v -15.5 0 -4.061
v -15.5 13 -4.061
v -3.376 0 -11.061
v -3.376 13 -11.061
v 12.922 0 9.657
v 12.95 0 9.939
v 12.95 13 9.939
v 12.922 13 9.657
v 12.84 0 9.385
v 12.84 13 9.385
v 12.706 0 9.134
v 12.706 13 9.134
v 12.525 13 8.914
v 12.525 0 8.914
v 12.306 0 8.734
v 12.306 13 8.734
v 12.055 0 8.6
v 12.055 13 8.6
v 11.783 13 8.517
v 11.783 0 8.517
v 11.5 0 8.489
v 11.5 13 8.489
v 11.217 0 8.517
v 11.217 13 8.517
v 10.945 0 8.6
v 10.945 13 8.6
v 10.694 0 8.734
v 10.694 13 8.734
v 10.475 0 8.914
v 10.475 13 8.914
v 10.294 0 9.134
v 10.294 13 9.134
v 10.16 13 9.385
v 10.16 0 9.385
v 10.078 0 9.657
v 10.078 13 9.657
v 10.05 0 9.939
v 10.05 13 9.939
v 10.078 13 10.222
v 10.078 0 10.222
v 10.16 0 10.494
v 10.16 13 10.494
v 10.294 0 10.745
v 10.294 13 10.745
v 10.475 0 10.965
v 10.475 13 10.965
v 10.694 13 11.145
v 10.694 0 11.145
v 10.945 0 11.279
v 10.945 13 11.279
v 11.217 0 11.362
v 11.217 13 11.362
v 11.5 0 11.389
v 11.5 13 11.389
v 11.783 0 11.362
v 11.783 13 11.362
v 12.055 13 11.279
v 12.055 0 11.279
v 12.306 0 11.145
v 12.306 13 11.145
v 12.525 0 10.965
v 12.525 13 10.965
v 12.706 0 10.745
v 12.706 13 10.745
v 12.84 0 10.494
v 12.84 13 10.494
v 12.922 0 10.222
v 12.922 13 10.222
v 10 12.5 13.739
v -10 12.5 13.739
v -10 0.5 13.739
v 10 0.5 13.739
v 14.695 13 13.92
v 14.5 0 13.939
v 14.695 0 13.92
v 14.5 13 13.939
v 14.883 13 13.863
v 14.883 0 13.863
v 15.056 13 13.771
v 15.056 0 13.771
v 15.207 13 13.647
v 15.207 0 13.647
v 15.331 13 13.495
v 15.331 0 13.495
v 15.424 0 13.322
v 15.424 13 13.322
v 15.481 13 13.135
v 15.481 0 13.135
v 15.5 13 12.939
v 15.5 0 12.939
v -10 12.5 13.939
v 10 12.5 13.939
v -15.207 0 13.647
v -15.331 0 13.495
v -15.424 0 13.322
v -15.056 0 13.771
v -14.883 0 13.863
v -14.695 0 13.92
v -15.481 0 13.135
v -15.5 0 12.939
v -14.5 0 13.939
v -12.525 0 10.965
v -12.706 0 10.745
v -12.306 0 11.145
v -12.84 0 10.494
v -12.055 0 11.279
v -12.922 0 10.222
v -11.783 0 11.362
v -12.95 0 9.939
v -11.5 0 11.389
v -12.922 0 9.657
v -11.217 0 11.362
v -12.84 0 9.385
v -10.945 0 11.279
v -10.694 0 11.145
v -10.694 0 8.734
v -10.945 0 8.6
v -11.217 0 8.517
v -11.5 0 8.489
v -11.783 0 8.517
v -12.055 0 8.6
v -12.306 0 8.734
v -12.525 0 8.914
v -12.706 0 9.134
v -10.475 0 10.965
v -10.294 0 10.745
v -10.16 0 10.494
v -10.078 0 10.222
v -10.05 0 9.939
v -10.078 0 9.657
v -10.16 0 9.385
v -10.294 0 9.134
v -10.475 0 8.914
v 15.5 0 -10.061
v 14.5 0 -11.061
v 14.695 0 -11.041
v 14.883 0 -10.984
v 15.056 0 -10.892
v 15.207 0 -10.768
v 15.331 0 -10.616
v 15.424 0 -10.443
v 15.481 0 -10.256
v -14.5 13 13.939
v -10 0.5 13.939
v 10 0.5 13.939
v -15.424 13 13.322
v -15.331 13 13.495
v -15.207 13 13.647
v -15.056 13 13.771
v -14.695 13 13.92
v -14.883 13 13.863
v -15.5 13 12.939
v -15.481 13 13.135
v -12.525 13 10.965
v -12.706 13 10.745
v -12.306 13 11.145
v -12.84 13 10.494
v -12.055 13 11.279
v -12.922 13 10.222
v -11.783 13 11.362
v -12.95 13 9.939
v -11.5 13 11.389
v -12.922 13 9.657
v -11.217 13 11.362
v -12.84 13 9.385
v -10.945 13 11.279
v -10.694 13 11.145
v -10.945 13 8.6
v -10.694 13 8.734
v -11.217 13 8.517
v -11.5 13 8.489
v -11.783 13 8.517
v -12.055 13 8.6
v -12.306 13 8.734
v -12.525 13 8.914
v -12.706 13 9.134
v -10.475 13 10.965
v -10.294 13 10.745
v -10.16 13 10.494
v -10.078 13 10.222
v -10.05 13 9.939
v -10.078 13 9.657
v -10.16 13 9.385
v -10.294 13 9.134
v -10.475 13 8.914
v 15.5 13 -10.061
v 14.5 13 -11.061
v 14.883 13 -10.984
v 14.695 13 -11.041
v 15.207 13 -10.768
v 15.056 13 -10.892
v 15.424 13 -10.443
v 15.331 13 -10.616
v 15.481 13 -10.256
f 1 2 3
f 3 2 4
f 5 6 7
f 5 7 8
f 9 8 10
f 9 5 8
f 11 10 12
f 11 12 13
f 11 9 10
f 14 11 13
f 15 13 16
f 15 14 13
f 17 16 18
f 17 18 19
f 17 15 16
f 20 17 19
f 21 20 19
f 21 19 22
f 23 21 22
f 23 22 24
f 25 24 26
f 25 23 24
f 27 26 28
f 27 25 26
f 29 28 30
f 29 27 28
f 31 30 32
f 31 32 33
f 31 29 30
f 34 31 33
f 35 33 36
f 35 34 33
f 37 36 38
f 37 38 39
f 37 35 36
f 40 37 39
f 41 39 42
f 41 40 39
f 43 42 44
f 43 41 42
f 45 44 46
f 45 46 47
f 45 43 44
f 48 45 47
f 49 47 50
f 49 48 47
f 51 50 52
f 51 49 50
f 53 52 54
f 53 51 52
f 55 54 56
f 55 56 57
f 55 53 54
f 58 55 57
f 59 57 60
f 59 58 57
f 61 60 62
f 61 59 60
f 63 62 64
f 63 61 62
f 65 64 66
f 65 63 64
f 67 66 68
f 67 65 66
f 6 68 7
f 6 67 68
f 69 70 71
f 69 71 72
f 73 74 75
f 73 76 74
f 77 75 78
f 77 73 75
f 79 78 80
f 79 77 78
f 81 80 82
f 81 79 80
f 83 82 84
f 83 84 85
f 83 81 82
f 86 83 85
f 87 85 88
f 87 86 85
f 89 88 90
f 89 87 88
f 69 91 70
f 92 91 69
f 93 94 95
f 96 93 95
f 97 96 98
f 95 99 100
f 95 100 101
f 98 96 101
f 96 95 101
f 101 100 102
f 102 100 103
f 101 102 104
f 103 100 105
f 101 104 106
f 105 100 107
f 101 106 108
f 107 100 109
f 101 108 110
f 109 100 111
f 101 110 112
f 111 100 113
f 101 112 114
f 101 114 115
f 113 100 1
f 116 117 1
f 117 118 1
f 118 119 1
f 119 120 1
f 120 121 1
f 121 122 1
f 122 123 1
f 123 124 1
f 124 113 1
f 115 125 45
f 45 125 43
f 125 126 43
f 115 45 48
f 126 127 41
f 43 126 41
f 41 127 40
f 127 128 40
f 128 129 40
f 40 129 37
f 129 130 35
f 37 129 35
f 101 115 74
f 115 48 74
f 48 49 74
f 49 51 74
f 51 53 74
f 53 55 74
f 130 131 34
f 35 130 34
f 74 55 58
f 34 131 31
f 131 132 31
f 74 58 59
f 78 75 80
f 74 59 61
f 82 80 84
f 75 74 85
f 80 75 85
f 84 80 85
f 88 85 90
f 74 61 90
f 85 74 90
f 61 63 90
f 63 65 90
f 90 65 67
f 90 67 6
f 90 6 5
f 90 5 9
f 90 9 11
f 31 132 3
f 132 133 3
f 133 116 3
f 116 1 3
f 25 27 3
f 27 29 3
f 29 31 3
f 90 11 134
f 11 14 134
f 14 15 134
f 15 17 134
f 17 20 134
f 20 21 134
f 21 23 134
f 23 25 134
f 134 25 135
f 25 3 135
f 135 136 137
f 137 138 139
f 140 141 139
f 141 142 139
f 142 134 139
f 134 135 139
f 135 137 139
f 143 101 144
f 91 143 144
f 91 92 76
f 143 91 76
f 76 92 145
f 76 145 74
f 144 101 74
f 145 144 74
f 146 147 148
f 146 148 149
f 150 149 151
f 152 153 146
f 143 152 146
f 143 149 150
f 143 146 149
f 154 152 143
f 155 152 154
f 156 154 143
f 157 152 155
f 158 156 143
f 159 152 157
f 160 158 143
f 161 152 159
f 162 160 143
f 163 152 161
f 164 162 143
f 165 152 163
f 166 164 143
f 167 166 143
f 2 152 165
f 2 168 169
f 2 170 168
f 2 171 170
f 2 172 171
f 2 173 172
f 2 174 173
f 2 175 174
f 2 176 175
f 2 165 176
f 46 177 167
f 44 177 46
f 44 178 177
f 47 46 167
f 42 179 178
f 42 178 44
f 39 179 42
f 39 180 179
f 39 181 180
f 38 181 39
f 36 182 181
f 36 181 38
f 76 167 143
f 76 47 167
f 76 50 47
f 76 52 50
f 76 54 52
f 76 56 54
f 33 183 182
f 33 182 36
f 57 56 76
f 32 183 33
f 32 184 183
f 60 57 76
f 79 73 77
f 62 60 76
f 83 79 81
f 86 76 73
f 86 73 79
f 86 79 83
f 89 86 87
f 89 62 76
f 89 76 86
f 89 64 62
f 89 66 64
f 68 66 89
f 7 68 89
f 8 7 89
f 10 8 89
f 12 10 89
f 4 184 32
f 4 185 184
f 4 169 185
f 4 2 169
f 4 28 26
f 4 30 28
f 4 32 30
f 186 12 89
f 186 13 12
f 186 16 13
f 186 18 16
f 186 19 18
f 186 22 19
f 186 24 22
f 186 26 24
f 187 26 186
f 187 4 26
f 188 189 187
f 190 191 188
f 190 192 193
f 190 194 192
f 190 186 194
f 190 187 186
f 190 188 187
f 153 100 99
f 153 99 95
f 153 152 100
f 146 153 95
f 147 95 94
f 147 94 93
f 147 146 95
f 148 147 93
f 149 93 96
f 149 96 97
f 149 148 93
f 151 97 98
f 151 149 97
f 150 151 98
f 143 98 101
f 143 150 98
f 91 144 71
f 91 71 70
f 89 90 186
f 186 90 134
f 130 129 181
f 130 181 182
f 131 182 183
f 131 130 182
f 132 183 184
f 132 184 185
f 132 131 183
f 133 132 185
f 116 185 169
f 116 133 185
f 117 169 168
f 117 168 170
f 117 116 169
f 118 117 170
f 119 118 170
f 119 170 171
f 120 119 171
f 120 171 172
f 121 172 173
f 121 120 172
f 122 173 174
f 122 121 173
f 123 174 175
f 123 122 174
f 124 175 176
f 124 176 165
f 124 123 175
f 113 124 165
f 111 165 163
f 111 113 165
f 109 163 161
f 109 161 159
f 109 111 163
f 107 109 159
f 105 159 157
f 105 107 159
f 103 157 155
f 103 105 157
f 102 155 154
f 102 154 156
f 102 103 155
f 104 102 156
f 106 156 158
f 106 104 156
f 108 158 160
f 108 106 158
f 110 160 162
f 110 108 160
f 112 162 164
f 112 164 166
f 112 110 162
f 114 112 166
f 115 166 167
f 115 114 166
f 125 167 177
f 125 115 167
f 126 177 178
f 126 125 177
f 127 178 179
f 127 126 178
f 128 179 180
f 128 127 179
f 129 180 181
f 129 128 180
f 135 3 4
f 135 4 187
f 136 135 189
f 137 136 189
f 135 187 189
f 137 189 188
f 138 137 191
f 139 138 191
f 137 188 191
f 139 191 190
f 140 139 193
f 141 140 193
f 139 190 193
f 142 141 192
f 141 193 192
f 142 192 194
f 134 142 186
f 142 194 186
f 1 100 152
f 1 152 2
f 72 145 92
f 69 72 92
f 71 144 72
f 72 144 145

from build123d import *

# Parameters (mm, degrees)
SKETCH1_W           = 31
SKETCH1_H           = 25
SKETCH1_R           = 1.45
BOSS_EXTRUDE1_DEPTH = 13
SKETCH2_W           = 20
SKETCH2_H           = 12
CUT_EXTRUDE1_DEPTH  = 0.2
CUT_EXTRUDE2_DEPTH  = 14
FILLET1_R           = 1


with BuildPart() as part:
    # Sketch1 → Boss-Extrude1 (new body)
    with BuildSketch(Plane(origin=(0, 0, 0), x_dir=(1, 0, 0), z_dir=(0, 1, 0))):
        with Locations((0, -1.439483729)):
            Rectangle(SKETCH1_W, SKETCH1_H)
        with Locations((-11.5, -9.939483729)):
            Circle(SKETCH1_R, mode=Mode.SUBTRACT)
        with Locations((11.5, -9.939483729)):
            Circle(SKETCH1_R, mode=Mode.SUBTRACT)
    extrude(amount=BOSS_EXTRUDE1_DEPTH)

    # Sketch2 → Cut-Extrude1 (cut)
    with BuildSketch(Plane.XY.offset(13.939483729)):
        with Locations((0, 6.5)):
            Rectangle(SKETCH2_W, SKETCH2_H)
    extrude(amount=-CUT_EXTRUDE1_DEPTH, mode=Mode.SUBTRACT)

    # Sketch3 → Cut-Extrude2 (cut, through all)
    with BuildSketch(Plane(origin=(0, 13, 0), x_dir=(1, 0, 0), z_dir=(0, 1, 0))):
        Polygon((-15.5, 4.060516271), (-3.375644347, 11.060516271), (-15.5, 11.060516271), align=None)
    extrude(amount=-CUT_EXTRUDE2_DEPTH, mode=Mode.SUBTRACT)

    # Fillet1
    fillet1_edges = [part.edges().sort_by_distance(p)[0] for p in [
        (15.5, 6.5, 13.939483729),
        (-15.5, 6.5, 13.939483729),
        (15.5, 6.5, -11.060516271),
    ]]
    fillet(fillet1_edges, radius=FILLET1_R)


solid = part.part
